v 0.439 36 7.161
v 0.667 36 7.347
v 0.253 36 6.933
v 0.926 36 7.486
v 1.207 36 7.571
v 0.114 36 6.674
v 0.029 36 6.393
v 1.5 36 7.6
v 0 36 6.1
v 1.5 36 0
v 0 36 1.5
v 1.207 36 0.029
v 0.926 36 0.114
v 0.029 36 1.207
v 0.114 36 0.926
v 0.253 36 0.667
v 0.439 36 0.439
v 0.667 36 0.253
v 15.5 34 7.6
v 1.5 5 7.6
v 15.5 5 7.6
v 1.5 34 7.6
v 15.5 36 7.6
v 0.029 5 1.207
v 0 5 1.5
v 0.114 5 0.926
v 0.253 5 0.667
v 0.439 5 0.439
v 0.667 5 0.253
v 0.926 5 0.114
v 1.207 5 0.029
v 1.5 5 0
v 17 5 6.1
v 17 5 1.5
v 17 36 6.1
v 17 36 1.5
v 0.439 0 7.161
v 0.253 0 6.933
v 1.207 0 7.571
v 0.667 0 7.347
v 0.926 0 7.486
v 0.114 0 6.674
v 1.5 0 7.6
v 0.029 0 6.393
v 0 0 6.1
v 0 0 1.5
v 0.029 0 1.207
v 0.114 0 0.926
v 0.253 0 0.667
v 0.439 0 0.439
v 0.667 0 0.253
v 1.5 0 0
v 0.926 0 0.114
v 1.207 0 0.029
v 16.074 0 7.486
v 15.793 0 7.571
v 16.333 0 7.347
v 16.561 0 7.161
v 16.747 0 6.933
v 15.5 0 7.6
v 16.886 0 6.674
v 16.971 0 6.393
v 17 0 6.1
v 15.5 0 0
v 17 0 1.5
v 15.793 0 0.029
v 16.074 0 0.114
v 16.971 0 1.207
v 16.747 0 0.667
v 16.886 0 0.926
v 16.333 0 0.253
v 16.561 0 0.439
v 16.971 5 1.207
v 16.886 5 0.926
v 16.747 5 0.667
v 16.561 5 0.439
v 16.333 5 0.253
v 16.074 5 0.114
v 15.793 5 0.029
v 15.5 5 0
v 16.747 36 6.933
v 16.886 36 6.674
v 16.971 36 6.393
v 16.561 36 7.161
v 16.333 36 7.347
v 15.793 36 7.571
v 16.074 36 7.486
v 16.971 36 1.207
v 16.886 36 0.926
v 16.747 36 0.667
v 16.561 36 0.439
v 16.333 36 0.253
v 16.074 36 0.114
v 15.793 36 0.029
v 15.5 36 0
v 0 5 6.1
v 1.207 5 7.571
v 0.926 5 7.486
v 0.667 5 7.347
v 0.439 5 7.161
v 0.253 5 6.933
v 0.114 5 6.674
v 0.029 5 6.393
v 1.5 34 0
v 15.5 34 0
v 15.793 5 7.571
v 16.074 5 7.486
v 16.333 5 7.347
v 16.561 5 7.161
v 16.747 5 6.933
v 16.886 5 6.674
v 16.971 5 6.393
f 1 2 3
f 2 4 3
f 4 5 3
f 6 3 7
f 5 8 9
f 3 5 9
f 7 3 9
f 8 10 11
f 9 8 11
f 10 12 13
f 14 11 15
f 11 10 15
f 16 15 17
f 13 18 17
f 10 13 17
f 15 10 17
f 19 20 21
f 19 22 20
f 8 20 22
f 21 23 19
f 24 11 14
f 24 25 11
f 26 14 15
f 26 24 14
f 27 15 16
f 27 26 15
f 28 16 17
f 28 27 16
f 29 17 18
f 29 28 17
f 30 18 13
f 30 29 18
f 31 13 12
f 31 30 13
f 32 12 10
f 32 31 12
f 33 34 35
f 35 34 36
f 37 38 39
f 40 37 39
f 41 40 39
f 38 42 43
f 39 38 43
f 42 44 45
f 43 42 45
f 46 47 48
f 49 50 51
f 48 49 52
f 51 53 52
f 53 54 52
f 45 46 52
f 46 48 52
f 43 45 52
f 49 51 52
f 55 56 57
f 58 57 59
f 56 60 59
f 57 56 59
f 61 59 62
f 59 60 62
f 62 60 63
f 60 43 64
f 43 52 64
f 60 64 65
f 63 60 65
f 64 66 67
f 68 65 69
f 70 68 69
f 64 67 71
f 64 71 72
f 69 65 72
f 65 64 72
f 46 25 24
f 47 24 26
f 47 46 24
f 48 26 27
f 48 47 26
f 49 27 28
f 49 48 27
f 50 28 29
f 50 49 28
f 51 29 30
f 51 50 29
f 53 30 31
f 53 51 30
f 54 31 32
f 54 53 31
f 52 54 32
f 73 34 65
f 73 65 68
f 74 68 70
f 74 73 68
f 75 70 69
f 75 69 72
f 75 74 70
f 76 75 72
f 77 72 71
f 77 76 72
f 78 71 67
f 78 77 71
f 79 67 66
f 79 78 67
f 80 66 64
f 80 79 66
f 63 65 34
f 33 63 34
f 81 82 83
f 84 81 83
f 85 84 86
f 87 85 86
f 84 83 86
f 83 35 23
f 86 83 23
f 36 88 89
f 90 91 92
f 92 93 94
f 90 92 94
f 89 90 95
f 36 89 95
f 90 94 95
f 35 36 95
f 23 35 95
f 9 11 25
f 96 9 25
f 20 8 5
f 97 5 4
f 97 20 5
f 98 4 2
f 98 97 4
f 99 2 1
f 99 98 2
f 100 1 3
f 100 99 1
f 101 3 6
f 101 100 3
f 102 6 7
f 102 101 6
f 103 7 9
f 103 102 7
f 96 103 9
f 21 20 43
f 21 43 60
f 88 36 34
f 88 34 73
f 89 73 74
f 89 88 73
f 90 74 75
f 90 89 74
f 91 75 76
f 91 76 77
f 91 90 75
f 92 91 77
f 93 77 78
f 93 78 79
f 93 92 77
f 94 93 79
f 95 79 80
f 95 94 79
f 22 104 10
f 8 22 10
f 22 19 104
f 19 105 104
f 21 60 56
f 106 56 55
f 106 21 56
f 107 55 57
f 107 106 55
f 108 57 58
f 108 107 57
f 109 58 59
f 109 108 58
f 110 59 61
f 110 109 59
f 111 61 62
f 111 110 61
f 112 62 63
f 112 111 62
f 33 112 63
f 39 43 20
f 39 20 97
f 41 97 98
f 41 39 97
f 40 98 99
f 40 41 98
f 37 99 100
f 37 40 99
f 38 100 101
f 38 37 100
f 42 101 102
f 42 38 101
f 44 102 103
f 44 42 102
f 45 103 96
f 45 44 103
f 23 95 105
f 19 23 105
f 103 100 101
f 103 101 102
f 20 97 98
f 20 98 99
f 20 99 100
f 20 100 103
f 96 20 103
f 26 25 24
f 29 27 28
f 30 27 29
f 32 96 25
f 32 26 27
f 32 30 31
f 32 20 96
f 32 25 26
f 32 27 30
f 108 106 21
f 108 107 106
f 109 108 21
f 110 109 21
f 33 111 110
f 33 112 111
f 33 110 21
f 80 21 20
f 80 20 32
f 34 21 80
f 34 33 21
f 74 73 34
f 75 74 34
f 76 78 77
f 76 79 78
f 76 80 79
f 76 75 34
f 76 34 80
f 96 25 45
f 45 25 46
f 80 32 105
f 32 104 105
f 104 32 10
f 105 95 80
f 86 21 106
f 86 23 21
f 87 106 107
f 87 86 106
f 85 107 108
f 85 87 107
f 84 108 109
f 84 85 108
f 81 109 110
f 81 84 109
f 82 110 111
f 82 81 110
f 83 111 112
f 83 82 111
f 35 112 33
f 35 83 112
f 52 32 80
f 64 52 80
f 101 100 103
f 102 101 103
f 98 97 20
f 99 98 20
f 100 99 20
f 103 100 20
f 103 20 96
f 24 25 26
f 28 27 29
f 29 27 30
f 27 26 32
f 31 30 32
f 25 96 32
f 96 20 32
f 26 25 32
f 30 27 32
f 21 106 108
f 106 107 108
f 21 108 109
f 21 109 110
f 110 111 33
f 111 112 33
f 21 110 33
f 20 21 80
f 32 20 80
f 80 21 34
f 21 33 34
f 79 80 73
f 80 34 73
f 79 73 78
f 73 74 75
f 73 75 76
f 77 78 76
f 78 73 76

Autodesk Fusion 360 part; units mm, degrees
sketch "Sketch1" plane through (0, 0, 0) normal (0, 0, 1) x (1, 0, 0)
  line L0 (0, 0) -> (17, 0)
  line L1 (17, 0) -> (17, 36)
  line L2 (17, 36) -> (0, 36)
  line L3 (0, 36) -> (0, 0)
  line L4 (15.5, 34) -> (1.5, 34)
  line L5 (1.5, 34) -> (1.5, 36)
  line L6 (1.5, 36) -> (15.5, 36)
  line L7 (15.5, 36) -> (15.5, 34)
  dimension "d1" = 17
  dimension "d2" = 36
  dimension "d7" = 2
  dimension "d8" = 14
extrude "Extrude1" add sketch "Sketch1" along normal blind 7.6 contours L0 L1 L2 L3 L4 L5 L7 makes body 1
ref_plane "WorkPlane1" through (8.5, 5, 3.8) normal (0, -1, 0) x (1, 0, 0)
fillet "Fillet1" radius 1.5 4 edges at (17, 18, 7.6) (17, 18, 0) (0, 18, 7.6) (0, 18, 0) on bodies 1
split "Split1" by plane through (8.5, 5, 3.8) normal (0, -1, 0) bodies 1 makes body 2 at (10.8334, 0, 5.0667)
